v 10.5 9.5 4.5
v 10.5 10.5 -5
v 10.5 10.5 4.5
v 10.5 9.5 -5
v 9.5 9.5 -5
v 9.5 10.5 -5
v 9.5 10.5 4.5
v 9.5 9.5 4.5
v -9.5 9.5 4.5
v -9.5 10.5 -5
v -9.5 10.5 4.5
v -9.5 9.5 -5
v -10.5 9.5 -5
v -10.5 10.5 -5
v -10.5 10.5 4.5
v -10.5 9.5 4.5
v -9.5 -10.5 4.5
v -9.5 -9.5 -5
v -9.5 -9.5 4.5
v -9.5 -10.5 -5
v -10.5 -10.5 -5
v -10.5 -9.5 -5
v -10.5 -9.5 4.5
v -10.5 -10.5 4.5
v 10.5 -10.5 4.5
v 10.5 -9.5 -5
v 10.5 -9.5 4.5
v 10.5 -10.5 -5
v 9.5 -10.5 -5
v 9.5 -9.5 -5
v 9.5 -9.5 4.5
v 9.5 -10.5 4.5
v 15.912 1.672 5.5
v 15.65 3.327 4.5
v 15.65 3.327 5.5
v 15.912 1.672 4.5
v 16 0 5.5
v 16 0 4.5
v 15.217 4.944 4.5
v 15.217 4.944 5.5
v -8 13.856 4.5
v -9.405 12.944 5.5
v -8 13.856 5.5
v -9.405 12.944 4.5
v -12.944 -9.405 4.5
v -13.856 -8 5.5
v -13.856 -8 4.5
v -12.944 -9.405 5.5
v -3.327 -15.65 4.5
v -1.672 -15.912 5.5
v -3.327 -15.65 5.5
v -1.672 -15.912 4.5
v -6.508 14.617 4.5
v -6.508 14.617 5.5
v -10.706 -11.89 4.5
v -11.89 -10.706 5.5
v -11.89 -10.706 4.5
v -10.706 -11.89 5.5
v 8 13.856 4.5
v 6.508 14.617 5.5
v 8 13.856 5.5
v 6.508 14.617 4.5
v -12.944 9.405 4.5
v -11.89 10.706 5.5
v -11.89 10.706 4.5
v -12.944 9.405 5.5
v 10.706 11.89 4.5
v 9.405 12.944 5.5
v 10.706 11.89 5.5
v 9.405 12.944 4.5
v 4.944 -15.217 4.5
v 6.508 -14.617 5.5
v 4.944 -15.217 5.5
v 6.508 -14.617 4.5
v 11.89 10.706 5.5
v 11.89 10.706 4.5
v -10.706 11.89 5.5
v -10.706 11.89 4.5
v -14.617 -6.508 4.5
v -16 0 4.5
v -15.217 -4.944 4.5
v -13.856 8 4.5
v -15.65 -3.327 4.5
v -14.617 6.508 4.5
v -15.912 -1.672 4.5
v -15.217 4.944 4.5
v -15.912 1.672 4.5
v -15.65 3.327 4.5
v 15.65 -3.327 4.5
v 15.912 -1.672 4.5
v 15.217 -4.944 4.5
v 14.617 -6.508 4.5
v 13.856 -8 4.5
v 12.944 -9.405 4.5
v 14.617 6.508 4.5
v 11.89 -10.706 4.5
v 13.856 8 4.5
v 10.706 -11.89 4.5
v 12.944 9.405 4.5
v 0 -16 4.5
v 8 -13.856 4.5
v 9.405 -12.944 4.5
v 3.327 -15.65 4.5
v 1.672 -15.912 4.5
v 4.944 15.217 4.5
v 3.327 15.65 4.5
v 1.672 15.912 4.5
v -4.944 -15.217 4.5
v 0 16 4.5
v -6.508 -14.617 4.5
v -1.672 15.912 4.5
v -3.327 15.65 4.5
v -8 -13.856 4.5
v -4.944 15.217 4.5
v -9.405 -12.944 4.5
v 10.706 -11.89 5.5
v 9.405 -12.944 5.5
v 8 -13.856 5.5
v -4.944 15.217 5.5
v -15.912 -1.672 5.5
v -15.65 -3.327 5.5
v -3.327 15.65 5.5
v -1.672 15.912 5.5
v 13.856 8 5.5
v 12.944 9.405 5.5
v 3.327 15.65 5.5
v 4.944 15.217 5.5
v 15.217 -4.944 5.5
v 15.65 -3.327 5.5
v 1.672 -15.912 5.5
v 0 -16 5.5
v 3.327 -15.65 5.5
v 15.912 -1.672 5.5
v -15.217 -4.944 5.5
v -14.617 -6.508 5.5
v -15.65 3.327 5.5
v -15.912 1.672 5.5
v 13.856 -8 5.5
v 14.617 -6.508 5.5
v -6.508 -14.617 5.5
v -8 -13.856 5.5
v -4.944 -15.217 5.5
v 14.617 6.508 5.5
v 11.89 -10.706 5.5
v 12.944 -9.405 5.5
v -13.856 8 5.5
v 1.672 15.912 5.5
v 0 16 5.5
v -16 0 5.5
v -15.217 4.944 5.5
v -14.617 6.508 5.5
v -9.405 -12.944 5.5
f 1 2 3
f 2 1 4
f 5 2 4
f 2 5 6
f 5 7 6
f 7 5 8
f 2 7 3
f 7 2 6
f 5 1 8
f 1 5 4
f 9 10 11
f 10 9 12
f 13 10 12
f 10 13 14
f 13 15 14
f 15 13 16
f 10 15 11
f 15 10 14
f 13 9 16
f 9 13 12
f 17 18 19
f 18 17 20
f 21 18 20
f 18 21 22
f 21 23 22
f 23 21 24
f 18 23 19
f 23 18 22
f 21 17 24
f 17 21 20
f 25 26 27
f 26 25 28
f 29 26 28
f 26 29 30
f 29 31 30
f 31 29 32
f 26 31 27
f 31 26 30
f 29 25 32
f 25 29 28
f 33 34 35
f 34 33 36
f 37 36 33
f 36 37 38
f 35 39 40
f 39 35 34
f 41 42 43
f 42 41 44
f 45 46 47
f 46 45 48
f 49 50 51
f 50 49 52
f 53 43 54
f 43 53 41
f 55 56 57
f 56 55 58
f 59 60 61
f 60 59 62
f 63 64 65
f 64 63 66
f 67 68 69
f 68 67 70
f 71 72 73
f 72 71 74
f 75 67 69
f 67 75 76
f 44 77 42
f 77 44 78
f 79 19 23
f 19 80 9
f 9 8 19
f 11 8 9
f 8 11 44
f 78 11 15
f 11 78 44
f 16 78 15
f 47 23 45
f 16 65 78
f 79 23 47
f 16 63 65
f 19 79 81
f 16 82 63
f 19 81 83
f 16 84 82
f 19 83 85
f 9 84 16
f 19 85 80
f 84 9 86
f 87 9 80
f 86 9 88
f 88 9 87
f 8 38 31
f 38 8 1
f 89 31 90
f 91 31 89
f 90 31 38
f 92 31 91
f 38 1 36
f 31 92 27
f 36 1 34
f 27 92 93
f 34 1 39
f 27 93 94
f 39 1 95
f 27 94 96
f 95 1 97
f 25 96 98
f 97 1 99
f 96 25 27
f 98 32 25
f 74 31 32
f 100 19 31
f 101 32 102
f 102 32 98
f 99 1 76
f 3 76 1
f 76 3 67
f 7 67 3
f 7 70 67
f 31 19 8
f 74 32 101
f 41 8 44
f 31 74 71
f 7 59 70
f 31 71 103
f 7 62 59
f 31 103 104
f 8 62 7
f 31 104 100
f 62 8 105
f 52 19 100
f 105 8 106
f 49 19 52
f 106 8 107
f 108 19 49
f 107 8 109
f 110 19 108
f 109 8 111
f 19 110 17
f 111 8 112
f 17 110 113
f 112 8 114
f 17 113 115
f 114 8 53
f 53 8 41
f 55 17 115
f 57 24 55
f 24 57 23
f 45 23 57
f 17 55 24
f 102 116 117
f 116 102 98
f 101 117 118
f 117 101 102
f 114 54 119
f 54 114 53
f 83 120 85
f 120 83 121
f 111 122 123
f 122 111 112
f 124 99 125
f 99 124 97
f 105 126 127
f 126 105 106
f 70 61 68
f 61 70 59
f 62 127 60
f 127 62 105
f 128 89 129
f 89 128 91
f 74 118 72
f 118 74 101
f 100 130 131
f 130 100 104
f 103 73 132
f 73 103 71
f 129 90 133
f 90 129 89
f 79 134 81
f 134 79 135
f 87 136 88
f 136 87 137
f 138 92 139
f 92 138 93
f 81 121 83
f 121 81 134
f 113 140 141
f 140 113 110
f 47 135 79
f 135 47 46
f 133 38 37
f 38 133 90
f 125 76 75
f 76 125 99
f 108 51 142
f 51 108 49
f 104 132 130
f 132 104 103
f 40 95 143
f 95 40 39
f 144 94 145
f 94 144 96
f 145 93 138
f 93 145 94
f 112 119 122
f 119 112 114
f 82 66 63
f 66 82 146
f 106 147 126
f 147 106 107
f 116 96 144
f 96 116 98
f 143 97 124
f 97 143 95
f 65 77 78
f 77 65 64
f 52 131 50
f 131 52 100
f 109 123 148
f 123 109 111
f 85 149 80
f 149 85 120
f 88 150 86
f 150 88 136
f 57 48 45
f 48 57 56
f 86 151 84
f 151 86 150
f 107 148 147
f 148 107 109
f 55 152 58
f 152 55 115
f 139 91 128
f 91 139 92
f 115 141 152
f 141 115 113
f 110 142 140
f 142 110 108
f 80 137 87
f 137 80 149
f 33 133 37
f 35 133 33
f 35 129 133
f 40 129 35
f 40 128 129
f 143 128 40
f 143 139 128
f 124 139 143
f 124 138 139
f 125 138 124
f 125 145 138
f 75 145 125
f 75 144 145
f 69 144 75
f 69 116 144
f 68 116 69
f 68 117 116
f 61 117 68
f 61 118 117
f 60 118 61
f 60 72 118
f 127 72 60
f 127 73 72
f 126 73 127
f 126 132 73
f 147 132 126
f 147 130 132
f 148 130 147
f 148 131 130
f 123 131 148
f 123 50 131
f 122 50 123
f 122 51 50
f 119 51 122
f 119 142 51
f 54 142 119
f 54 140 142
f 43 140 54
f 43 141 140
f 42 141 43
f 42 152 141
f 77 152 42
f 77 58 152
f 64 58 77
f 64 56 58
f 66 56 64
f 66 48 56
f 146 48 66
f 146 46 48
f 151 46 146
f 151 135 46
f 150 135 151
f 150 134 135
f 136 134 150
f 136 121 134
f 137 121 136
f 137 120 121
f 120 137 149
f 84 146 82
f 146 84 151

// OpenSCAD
module Table_03(){

    Table_Leg = [1,1,10];

    Leg_Distance_x = 20;
    Leg_Distance_y = Leg_Distance_x;
    Upper_Part_Size = Leg_Distance_x * 0.8;
    Upper_Part_Height = 1;



    color("#cdaa7d"){
    // Legs 
    translate([Leg_Distance_x*0.5,Leg_Distance_y*0.5,0])
    cube([Table_Leg[0],Table_Leg[1],Table_Leg[2]],center=true);

    translate([-Leg_Distance_x*0.5,Leg_Distance_y*0.5,0])
    cube([Table_Leg[0],Table_Leg[1],Table_Leg[2]],center=true);

    translate([-Leg_Distance_x*0.5,-Leg_Distance_y*0.5,0])
    cube([Table_Leg[0],Table_Leg[1],Table_Leg[2]],center=true);

    translate([Leg_Distance_x*0.5,-Leg_Distance_y*0.5,0])
    cube([Table_Leg[0],Table_Leg[1],Table_Leg[2]],center=true);

    Table_Upper = [Leg_Distance_x+Table_Leg[0],Leg_Distance_y + Table_Leg[1],1];
    Table_Height = Table_Leg[2]*0.5;

    // Circle
    translate([0,0,Table_Height]){
    cylinder(r = Upper_Part_Size, h = Upper_Part_Height,$fn = 60 , center=true);
    }

    }

}

Table_03();

// Written by Nicolì Angelo (Gengio) 2024: 
// MIT License

//Permission is hereby granted, free of charge, to any person obtaining a copy of this software and associated documentation files (the "Software"), to deal in the Software without restriction, including without limitation the rights to use, copy, modify, merge, publish, distribute, sublicense, and/or sell copies of the Software, and to permit persons to whom the Software is furnished to do so, subject to the following conditions:

//The above copyright notice and this permission notice shall be included in all copies or substantial portions of the Software.

//THE SOFTWARE IS PROVIDED "AS IS", WITHOUT WARRANTY OF ANY KIND, EXPRESS OR IMPLIED, INCLUDING BUT NOT LIMITED TO THE WARRANTIES OF MERCHANTABILITY, FITNESS FOR A PARTICULAR PURPOSE AND NONINFRINGEMENT. IN NO EVENT SHALL THE AUTHORS OR COPYRIGHT HOLDERS BE LIABLE FOR ANY CLAIM, DAMAGES OR OTHER LIABILITY, WHETHER IN AN ACTION OF CONTRACT, TORT OR OTHERWISE, ARISING FROM, OUT OF OR IN CONNECTION WITH THE SOFTWARE OR THE USE OR OTHER DEALINGS IN THE SOFTWARE.
